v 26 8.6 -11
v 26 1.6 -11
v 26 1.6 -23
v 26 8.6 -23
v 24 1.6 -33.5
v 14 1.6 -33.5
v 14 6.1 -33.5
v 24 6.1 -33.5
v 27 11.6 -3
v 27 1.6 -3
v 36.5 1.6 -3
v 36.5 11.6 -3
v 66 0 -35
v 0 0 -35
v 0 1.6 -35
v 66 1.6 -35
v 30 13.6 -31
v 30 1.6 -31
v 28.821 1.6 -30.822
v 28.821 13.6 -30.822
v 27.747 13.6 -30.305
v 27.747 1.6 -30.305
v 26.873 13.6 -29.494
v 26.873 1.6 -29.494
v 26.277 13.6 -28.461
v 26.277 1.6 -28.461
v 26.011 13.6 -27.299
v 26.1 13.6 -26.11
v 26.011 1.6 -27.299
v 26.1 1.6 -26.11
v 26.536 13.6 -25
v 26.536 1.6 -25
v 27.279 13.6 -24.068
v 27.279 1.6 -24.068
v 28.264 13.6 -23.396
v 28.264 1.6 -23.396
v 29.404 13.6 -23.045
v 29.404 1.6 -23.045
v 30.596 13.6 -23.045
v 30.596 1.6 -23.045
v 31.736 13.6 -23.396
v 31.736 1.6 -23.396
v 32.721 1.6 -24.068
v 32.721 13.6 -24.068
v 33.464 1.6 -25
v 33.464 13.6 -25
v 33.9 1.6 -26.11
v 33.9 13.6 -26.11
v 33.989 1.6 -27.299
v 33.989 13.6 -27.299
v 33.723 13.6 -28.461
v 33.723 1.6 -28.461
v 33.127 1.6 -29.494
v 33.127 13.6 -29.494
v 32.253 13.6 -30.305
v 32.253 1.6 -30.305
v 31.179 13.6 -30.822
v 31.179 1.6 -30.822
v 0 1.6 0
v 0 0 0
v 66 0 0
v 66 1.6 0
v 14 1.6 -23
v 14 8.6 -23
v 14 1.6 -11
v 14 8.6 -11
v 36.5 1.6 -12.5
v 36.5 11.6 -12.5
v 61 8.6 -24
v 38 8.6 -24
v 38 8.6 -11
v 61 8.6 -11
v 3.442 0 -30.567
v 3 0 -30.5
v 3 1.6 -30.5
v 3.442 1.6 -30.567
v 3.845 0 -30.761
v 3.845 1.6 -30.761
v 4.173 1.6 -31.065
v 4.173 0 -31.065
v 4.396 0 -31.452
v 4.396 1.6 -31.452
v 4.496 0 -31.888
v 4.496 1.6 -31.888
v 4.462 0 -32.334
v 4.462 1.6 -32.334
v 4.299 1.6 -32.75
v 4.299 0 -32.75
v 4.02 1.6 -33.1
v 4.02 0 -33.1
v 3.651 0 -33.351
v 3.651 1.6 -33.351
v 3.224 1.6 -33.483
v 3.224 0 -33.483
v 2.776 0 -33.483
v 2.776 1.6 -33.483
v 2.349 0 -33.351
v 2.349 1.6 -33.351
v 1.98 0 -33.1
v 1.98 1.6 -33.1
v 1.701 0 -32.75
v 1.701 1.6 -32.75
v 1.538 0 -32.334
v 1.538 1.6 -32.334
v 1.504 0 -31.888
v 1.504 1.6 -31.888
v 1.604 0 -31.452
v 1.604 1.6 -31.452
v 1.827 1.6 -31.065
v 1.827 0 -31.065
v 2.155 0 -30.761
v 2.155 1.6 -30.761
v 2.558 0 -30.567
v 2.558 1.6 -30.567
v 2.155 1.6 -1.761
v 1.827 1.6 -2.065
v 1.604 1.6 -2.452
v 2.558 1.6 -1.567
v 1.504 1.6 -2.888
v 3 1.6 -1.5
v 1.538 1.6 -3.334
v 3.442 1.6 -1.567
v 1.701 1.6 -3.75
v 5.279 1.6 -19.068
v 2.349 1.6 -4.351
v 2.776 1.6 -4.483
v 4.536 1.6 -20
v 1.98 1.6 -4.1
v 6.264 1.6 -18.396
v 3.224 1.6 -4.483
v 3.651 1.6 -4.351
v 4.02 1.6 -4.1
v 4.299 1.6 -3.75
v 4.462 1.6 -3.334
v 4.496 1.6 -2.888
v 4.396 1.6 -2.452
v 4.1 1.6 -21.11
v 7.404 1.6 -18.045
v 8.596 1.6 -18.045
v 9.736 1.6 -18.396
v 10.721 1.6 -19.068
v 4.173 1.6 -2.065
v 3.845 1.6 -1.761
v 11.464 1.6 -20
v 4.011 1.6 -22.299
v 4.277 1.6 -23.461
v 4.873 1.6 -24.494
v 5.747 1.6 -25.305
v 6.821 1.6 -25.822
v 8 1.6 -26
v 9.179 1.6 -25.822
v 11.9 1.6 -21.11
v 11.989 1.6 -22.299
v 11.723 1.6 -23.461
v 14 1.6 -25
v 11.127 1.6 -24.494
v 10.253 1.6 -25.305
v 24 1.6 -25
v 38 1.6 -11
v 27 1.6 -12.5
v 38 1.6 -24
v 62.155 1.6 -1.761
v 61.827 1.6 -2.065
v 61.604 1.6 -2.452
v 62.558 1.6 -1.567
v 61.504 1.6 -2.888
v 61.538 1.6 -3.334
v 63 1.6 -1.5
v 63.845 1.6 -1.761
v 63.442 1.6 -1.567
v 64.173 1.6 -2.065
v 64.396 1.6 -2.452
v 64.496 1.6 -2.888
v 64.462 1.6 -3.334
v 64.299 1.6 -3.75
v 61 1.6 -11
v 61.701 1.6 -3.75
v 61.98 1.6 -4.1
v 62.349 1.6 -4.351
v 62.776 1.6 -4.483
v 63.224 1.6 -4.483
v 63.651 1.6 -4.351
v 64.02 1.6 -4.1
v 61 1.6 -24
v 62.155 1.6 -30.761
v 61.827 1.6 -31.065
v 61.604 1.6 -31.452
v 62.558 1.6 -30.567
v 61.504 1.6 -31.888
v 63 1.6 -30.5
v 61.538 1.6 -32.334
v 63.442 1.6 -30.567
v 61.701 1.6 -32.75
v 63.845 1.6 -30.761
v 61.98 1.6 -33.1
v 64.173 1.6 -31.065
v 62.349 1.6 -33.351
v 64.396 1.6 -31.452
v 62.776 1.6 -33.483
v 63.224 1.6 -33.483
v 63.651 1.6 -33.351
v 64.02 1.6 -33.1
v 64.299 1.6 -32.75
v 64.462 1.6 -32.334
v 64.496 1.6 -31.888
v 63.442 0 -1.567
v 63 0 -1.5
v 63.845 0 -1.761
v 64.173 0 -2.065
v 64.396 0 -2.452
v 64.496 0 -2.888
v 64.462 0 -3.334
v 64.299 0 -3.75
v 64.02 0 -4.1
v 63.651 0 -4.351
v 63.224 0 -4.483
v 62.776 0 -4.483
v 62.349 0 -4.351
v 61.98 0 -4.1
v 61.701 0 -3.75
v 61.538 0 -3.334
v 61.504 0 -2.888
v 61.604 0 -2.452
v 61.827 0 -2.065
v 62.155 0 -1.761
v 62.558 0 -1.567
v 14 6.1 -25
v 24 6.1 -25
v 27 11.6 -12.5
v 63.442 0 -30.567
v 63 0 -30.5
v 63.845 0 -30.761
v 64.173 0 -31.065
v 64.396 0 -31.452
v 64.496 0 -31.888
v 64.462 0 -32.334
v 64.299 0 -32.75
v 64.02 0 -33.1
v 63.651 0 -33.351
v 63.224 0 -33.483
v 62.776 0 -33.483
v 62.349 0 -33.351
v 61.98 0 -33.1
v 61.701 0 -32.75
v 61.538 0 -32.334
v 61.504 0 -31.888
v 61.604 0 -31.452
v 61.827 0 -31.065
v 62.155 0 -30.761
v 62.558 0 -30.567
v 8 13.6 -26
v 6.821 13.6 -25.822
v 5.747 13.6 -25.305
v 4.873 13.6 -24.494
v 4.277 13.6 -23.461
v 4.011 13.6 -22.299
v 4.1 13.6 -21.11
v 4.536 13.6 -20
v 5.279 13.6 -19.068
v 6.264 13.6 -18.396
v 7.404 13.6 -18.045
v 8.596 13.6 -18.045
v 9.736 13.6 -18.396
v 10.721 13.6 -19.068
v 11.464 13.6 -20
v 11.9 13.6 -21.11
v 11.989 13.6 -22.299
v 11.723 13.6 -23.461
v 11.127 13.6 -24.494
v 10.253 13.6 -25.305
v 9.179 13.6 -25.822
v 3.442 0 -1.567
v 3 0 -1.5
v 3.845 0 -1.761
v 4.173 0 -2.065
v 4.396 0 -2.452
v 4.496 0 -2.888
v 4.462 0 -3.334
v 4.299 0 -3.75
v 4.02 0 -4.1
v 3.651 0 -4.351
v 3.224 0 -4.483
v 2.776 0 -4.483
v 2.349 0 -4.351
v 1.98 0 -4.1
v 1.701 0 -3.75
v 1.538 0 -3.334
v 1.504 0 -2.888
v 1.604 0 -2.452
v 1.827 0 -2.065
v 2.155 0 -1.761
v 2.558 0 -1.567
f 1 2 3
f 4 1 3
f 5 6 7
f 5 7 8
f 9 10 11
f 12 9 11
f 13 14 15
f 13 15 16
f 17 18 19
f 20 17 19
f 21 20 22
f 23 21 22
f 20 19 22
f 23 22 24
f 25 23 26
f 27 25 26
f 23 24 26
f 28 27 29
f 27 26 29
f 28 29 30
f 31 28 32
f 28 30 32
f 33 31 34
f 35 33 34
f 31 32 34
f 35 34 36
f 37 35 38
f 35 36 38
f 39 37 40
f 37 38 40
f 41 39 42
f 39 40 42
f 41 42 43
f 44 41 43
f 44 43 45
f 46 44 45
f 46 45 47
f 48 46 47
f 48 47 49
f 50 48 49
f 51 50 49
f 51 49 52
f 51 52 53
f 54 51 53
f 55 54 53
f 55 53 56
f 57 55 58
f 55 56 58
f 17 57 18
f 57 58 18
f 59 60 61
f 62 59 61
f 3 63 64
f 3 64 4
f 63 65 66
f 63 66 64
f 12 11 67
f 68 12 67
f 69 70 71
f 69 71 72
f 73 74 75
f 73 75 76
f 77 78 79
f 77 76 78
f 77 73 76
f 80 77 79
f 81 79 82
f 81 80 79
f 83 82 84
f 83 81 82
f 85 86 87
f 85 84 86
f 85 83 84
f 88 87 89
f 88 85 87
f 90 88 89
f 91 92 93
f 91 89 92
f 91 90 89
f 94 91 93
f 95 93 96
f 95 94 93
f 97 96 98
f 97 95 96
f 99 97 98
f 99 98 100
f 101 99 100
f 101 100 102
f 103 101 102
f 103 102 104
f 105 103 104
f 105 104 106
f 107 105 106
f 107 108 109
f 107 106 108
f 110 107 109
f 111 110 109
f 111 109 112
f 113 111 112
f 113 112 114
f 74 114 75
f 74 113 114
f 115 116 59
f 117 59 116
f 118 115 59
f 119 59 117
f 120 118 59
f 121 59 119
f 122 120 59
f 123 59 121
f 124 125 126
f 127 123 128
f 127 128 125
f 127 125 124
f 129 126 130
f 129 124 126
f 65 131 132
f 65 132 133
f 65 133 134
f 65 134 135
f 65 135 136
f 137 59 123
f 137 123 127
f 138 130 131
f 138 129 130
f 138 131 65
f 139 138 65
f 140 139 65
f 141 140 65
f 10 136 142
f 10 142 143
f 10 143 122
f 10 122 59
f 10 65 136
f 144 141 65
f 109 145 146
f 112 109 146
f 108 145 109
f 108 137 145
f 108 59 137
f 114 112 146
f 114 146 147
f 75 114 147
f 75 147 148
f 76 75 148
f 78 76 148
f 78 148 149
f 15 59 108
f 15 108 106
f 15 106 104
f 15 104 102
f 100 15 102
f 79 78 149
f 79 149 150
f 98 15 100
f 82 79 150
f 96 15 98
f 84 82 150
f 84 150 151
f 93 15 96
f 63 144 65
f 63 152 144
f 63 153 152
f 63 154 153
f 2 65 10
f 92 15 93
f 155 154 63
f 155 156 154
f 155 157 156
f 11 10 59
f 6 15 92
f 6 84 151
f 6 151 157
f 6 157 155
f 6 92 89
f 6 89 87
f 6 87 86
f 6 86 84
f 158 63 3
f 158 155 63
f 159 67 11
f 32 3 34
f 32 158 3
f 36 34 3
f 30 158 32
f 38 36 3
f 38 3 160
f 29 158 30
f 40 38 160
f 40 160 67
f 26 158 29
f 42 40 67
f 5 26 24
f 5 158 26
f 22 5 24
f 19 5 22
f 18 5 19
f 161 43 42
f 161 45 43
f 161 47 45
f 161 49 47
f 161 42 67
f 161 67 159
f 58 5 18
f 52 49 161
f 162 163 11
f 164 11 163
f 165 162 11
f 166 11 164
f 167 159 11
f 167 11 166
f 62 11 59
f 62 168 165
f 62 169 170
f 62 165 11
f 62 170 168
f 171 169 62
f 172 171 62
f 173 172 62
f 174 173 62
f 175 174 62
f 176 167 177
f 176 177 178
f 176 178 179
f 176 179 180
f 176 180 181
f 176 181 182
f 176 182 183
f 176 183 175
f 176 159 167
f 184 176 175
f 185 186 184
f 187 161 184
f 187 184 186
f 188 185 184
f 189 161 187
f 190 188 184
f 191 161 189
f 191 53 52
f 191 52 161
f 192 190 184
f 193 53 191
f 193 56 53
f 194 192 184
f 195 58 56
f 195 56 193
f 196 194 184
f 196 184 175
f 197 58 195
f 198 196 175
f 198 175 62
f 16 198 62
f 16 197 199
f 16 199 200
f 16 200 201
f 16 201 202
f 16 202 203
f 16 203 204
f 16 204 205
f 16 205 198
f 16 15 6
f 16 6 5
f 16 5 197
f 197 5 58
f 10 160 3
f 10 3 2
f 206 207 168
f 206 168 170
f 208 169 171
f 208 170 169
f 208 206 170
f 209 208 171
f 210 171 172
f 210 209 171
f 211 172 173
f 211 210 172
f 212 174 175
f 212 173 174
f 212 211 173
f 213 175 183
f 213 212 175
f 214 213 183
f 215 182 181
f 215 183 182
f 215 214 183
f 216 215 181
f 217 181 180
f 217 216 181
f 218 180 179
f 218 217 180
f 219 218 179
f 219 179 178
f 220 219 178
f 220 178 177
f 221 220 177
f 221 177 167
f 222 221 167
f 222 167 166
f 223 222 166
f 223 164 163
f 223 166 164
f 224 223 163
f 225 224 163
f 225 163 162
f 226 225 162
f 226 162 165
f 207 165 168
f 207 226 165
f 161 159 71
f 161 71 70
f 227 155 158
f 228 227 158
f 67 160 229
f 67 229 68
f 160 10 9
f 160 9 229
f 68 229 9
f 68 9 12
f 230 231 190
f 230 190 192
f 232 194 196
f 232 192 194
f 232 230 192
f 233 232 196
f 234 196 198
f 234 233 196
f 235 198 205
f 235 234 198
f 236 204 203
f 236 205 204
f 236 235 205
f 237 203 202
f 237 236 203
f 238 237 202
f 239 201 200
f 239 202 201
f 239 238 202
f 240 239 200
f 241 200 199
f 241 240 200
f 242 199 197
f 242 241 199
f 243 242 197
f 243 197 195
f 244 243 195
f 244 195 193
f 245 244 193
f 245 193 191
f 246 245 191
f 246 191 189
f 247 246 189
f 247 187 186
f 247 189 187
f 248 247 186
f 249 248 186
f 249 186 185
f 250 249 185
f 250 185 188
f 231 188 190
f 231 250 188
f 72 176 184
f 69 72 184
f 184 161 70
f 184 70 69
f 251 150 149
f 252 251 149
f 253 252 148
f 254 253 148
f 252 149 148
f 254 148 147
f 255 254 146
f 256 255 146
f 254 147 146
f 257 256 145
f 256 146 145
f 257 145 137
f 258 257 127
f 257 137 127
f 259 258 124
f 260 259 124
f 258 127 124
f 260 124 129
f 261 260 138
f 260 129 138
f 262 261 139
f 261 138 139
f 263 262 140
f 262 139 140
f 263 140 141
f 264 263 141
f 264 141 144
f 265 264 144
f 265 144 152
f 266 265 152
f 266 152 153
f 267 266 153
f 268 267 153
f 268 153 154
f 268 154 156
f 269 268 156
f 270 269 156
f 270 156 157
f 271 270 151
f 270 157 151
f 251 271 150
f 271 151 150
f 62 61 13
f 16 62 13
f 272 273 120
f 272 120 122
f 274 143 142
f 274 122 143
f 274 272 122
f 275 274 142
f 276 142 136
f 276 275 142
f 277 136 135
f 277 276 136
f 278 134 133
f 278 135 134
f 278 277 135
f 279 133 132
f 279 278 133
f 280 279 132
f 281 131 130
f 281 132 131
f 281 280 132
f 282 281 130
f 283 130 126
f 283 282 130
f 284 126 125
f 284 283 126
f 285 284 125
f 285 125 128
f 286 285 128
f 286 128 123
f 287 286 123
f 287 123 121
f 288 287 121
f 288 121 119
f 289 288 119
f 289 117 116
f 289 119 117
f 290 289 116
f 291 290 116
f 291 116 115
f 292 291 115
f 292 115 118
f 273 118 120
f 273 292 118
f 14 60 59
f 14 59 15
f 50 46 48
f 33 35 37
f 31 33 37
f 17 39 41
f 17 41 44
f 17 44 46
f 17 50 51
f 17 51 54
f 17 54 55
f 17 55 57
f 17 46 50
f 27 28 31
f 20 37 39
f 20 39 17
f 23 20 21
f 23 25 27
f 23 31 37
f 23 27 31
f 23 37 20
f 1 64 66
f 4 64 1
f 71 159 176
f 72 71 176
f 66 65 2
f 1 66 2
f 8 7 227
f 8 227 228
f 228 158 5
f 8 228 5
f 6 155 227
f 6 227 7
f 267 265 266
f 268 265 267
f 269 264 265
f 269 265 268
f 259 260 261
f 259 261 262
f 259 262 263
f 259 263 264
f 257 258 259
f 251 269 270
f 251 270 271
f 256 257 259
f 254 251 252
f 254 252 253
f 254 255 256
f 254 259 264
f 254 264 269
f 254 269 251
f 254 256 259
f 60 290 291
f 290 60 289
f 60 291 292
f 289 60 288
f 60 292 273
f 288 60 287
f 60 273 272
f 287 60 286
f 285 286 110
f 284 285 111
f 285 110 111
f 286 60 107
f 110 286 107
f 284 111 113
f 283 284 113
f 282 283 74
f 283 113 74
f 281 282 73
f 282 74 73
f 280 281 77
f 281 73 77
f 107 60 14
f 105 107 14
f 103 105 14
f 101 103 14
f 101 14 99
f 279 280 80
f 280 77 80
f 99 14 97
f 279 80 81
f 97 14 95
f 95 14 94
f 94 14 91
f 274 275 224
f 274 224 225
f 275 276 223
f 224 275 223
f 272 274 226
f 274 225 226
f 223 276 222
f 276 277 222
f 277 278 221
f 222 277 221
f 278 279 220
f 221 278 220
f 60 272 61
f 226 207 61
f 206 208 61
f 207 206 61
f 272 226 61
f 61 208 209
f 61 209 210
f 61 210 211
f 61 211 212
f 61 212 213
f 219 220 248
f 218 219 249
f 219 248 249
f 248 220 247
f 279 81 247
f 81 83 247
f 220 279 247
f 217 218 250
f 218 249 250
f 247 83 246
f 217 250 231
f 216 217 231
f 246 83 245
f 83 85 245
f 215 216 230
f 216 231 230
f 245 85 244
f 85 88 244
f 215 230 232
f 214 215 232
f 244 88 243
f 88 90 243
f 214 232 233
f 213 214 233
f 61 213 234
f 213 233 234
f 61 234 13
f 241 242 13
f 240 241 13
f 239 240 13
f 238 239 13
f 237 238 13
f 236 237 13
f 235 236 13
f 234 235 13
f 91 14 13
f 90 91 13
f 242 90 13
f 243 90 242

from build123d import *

# Parameters (mm, degrees)
SKETCH1_W               = 66
SKETCH1_H               = 35
PCB_DEPTH               = 1.6
MOUNT_HOLE_1_DEPTH      = 75.723222629
MOUNT_HOLE_1_DEPTH_BACK = 75.723222629
SKETCH2_R               = 1.5
MOUNT_HOLE_2_DEPTH      = 75.723222629
MOUNT_HOLE_2_DEPTH_BACK = 75.723222629
SKETCH3_R               = 1.5
MOUNT_HOLE_3_DEPTH      = 75.723222629
MOUNT_HOLE_3_DEPTH_BACK = 75.723222629
SKETCH4_R               = 1.5
MOUNT_HOLE_4_DEPTH      = 75.723222629
MOUNT_HOLE_4_DEPTH_BACK = 75.723222629
SKETCH5_R               = 1.5
VOLTMETER_DISPLAY_START = 1.6
SKETCH6_W               = 23
SKETCH6_H               = 13
VOLTMETER_DISPLAY_DEPTH = 7
INDUCTOR_START          = 1.6
SKETCH7_W               = 12
SKETCH7_H               = 12
INDUCTOR_DEPTH          = 7
CAP_IN_START            = 1.6
SKETCH8_R               = 4
CAP_IN_DEPTH            = 12
CAP_OUT_START           = 1.6
SKETCH9_R               = 4
CAP_OUT_DEPTH           = 12
TRIM_POT_START          = 1.6
SKETCH10_W              = 9.5
SKETCH10_H              = 9.5
TRIM_POT_DEPTH          = 10
LM2596_START            = 1.6
SKETCH11_W              = 10
SKETCH11_H              = 8.5
LM2596_DEPTH            = 4.5


with BuildPart() as part:
    # Sketch1 → PCB (new body)
    with BuildSketch(Plane(origin=(0, 0, 0), x_dir=(1, 0, 0), z_dir=(0, 1, 0))):
        with Locations((33, 17.5)):
            Rectangle(SKETCH1_W, SKETCH1_H)
    extrude(amount=PCB_DEPTH)

    # Sketch2 → Mount_hole_1 (cut, two sides: drawn at the far end of the back side and taken through both)
    with BuildSketch(Plane(origin=(0, 0, 0), x_dir=(1, 0, 0), z_dir=(0, 1, 0)).offset(-MOUNT_HOLE_1_DEPTH_BACK)):
        with Locations(Location((3, 3, 0), (0, 0, 270))):
            Circle(SKETCH2_R)
    extrude(amount=MOUNT_HOLE_1_DEPTH + MOUNT_HOLE_1_DEPTH_BACK, mode=Mode.SUBTRACT)

    # Sketch3 → Mount_hole_2 (cut, two sides: drawn at the far end of the back side and taken through both)
    with BuildSketch(Plane(origin=(0, 0, 0), x_dir=(1, 0, 0), z_dir=(0, 1, 0)).offset(-MOUNT_HOLE_2_DEPTH_BACK)):
        with Locations(Location((63, 3, 0), (0, 0, 270))):
            Circle(SKETCH3_R)
    extrude(amount=MOUNT_HOLE_2_DEPTH + MOUNT_HOLE_2_DEPTH_BACK, mode=Mode.SUBTRACT)

    # Sketch4 → Mount_hole_3 (cut, two sides: drawn at the far end of the back side and taken through both)
    with BuildSketch(Plane(origin=(0, 0, 0), x_dir=(1, 0, 0), z_dir=(0, 1, 0)).offset(-MOUNT_HOLE_3_DEPTH_BACK)):
        with Locations(Location((3, 32, 0), (0, 0, 270))):
            Circle(SKETCH4_R)
    extrude(amount=MOUNT_HOLE_3_DEPTH + MOUNT_HOLE_3_DEPTH_BACK, mode=Mode.SUBTRACT)

    # Sketch5 → Mount_hole_4 (cut, two sides: drawn at the far end of the back side and taken through both)
    with BuildSketch(Plane(origin=(0, 0, 0), x_dir=(1, 0, 0), z_dir=(0, 1, 0)).offset(-MOUNT_HOLE_4_DEPTH_BACK)):
        with Locations(Location((63, 32, 0), (0, 0, 270))):
            Circle(SKETCH5_R)
    extrude(amount=MOUNT_HOLE_4_DEPTH + MOUNT_HOLE_4_DEPTH_BACK, mode=Mode.SUBTRACT)

    # Sketch6 → Voltmeter_display (add)
    with BuildSketch(Plane(origin=(0, 0, 0), x_dir=(1, 0, 0), z_dir=(0, 1, 0)).offset(VOLTMETER_DISPLAY_START)):
        with Locations((49.5, 17.5)):
            Rectangle(SKETCH6_W, SKETCH6_H)
    extrude(amount=VOLTMETER_DISPLAY_DEPTH)

    # Sketch7 → Inductor (add)
    with BuildSketch(Plane(origin=(0, 0, 0), x_dir=(1, 0, 0), z_dir=(0, 1, 0)).offset(INDUCTOR_START)):
        with Locations((20, 17)):
            Rectangle(SKETCH7_W, SKETCH7_H)
    extrude(amount=INDUCTOR_DEPTH)

    # Sketch8 → Cap_in (add)
    with BuildSketch(Plane(origin=(0, 0, 0), x_dir=(1, 0, 0), z_dir=(0, 1, 0)).offset(CAP_IN_START)):
        with Locations(Location((8, 22, 0), (0, 0, 90))):
            Circle(SKETCH8_R)
    extrude(amount=CAP_IN_DEPTH)

    # Sketch9 → Cap_out (add)
    with BuildSketch(Plane(origin=(0, 0, 0), x_dir=(1, 0, 0), z_dir=(0, 1, 0)).offset(CAP_OUT_START)):
        with Locations(Location((30, 27, 0), (0, 0, 90))):
            Circle(SKETCH9_R)
    extrude(amount=CAP_OUT_DEPTH)

    # Sketch10 → Trim_pot (add)
    with BuildSketch(Plane(origin=(0, 0, 0), x_dir=(1, 0, 0), z_dir=(0, 1, 0)).offset(TRIM_POT_START)):
        with Locations((31.75, 7.75)):
            Rectangle(SKETCH10_W, SKETCH10_H)
    extrude(amount=TRIM_POT_DEPTH)

    # Sketch11 → LM2596 (add)
    with BuildSketch(Plane(origin=(0, 0, 0), x_dir=(1, 0, 0), z_dir=(0, 1, 0)).offset(LM2596_START)):
        with Locations((19, 29.25)):
            Rectangle(SKETCH11_W, SKETCH11_H)
    extrude(amount=LM2596_DEPTH)


solid = part.part
